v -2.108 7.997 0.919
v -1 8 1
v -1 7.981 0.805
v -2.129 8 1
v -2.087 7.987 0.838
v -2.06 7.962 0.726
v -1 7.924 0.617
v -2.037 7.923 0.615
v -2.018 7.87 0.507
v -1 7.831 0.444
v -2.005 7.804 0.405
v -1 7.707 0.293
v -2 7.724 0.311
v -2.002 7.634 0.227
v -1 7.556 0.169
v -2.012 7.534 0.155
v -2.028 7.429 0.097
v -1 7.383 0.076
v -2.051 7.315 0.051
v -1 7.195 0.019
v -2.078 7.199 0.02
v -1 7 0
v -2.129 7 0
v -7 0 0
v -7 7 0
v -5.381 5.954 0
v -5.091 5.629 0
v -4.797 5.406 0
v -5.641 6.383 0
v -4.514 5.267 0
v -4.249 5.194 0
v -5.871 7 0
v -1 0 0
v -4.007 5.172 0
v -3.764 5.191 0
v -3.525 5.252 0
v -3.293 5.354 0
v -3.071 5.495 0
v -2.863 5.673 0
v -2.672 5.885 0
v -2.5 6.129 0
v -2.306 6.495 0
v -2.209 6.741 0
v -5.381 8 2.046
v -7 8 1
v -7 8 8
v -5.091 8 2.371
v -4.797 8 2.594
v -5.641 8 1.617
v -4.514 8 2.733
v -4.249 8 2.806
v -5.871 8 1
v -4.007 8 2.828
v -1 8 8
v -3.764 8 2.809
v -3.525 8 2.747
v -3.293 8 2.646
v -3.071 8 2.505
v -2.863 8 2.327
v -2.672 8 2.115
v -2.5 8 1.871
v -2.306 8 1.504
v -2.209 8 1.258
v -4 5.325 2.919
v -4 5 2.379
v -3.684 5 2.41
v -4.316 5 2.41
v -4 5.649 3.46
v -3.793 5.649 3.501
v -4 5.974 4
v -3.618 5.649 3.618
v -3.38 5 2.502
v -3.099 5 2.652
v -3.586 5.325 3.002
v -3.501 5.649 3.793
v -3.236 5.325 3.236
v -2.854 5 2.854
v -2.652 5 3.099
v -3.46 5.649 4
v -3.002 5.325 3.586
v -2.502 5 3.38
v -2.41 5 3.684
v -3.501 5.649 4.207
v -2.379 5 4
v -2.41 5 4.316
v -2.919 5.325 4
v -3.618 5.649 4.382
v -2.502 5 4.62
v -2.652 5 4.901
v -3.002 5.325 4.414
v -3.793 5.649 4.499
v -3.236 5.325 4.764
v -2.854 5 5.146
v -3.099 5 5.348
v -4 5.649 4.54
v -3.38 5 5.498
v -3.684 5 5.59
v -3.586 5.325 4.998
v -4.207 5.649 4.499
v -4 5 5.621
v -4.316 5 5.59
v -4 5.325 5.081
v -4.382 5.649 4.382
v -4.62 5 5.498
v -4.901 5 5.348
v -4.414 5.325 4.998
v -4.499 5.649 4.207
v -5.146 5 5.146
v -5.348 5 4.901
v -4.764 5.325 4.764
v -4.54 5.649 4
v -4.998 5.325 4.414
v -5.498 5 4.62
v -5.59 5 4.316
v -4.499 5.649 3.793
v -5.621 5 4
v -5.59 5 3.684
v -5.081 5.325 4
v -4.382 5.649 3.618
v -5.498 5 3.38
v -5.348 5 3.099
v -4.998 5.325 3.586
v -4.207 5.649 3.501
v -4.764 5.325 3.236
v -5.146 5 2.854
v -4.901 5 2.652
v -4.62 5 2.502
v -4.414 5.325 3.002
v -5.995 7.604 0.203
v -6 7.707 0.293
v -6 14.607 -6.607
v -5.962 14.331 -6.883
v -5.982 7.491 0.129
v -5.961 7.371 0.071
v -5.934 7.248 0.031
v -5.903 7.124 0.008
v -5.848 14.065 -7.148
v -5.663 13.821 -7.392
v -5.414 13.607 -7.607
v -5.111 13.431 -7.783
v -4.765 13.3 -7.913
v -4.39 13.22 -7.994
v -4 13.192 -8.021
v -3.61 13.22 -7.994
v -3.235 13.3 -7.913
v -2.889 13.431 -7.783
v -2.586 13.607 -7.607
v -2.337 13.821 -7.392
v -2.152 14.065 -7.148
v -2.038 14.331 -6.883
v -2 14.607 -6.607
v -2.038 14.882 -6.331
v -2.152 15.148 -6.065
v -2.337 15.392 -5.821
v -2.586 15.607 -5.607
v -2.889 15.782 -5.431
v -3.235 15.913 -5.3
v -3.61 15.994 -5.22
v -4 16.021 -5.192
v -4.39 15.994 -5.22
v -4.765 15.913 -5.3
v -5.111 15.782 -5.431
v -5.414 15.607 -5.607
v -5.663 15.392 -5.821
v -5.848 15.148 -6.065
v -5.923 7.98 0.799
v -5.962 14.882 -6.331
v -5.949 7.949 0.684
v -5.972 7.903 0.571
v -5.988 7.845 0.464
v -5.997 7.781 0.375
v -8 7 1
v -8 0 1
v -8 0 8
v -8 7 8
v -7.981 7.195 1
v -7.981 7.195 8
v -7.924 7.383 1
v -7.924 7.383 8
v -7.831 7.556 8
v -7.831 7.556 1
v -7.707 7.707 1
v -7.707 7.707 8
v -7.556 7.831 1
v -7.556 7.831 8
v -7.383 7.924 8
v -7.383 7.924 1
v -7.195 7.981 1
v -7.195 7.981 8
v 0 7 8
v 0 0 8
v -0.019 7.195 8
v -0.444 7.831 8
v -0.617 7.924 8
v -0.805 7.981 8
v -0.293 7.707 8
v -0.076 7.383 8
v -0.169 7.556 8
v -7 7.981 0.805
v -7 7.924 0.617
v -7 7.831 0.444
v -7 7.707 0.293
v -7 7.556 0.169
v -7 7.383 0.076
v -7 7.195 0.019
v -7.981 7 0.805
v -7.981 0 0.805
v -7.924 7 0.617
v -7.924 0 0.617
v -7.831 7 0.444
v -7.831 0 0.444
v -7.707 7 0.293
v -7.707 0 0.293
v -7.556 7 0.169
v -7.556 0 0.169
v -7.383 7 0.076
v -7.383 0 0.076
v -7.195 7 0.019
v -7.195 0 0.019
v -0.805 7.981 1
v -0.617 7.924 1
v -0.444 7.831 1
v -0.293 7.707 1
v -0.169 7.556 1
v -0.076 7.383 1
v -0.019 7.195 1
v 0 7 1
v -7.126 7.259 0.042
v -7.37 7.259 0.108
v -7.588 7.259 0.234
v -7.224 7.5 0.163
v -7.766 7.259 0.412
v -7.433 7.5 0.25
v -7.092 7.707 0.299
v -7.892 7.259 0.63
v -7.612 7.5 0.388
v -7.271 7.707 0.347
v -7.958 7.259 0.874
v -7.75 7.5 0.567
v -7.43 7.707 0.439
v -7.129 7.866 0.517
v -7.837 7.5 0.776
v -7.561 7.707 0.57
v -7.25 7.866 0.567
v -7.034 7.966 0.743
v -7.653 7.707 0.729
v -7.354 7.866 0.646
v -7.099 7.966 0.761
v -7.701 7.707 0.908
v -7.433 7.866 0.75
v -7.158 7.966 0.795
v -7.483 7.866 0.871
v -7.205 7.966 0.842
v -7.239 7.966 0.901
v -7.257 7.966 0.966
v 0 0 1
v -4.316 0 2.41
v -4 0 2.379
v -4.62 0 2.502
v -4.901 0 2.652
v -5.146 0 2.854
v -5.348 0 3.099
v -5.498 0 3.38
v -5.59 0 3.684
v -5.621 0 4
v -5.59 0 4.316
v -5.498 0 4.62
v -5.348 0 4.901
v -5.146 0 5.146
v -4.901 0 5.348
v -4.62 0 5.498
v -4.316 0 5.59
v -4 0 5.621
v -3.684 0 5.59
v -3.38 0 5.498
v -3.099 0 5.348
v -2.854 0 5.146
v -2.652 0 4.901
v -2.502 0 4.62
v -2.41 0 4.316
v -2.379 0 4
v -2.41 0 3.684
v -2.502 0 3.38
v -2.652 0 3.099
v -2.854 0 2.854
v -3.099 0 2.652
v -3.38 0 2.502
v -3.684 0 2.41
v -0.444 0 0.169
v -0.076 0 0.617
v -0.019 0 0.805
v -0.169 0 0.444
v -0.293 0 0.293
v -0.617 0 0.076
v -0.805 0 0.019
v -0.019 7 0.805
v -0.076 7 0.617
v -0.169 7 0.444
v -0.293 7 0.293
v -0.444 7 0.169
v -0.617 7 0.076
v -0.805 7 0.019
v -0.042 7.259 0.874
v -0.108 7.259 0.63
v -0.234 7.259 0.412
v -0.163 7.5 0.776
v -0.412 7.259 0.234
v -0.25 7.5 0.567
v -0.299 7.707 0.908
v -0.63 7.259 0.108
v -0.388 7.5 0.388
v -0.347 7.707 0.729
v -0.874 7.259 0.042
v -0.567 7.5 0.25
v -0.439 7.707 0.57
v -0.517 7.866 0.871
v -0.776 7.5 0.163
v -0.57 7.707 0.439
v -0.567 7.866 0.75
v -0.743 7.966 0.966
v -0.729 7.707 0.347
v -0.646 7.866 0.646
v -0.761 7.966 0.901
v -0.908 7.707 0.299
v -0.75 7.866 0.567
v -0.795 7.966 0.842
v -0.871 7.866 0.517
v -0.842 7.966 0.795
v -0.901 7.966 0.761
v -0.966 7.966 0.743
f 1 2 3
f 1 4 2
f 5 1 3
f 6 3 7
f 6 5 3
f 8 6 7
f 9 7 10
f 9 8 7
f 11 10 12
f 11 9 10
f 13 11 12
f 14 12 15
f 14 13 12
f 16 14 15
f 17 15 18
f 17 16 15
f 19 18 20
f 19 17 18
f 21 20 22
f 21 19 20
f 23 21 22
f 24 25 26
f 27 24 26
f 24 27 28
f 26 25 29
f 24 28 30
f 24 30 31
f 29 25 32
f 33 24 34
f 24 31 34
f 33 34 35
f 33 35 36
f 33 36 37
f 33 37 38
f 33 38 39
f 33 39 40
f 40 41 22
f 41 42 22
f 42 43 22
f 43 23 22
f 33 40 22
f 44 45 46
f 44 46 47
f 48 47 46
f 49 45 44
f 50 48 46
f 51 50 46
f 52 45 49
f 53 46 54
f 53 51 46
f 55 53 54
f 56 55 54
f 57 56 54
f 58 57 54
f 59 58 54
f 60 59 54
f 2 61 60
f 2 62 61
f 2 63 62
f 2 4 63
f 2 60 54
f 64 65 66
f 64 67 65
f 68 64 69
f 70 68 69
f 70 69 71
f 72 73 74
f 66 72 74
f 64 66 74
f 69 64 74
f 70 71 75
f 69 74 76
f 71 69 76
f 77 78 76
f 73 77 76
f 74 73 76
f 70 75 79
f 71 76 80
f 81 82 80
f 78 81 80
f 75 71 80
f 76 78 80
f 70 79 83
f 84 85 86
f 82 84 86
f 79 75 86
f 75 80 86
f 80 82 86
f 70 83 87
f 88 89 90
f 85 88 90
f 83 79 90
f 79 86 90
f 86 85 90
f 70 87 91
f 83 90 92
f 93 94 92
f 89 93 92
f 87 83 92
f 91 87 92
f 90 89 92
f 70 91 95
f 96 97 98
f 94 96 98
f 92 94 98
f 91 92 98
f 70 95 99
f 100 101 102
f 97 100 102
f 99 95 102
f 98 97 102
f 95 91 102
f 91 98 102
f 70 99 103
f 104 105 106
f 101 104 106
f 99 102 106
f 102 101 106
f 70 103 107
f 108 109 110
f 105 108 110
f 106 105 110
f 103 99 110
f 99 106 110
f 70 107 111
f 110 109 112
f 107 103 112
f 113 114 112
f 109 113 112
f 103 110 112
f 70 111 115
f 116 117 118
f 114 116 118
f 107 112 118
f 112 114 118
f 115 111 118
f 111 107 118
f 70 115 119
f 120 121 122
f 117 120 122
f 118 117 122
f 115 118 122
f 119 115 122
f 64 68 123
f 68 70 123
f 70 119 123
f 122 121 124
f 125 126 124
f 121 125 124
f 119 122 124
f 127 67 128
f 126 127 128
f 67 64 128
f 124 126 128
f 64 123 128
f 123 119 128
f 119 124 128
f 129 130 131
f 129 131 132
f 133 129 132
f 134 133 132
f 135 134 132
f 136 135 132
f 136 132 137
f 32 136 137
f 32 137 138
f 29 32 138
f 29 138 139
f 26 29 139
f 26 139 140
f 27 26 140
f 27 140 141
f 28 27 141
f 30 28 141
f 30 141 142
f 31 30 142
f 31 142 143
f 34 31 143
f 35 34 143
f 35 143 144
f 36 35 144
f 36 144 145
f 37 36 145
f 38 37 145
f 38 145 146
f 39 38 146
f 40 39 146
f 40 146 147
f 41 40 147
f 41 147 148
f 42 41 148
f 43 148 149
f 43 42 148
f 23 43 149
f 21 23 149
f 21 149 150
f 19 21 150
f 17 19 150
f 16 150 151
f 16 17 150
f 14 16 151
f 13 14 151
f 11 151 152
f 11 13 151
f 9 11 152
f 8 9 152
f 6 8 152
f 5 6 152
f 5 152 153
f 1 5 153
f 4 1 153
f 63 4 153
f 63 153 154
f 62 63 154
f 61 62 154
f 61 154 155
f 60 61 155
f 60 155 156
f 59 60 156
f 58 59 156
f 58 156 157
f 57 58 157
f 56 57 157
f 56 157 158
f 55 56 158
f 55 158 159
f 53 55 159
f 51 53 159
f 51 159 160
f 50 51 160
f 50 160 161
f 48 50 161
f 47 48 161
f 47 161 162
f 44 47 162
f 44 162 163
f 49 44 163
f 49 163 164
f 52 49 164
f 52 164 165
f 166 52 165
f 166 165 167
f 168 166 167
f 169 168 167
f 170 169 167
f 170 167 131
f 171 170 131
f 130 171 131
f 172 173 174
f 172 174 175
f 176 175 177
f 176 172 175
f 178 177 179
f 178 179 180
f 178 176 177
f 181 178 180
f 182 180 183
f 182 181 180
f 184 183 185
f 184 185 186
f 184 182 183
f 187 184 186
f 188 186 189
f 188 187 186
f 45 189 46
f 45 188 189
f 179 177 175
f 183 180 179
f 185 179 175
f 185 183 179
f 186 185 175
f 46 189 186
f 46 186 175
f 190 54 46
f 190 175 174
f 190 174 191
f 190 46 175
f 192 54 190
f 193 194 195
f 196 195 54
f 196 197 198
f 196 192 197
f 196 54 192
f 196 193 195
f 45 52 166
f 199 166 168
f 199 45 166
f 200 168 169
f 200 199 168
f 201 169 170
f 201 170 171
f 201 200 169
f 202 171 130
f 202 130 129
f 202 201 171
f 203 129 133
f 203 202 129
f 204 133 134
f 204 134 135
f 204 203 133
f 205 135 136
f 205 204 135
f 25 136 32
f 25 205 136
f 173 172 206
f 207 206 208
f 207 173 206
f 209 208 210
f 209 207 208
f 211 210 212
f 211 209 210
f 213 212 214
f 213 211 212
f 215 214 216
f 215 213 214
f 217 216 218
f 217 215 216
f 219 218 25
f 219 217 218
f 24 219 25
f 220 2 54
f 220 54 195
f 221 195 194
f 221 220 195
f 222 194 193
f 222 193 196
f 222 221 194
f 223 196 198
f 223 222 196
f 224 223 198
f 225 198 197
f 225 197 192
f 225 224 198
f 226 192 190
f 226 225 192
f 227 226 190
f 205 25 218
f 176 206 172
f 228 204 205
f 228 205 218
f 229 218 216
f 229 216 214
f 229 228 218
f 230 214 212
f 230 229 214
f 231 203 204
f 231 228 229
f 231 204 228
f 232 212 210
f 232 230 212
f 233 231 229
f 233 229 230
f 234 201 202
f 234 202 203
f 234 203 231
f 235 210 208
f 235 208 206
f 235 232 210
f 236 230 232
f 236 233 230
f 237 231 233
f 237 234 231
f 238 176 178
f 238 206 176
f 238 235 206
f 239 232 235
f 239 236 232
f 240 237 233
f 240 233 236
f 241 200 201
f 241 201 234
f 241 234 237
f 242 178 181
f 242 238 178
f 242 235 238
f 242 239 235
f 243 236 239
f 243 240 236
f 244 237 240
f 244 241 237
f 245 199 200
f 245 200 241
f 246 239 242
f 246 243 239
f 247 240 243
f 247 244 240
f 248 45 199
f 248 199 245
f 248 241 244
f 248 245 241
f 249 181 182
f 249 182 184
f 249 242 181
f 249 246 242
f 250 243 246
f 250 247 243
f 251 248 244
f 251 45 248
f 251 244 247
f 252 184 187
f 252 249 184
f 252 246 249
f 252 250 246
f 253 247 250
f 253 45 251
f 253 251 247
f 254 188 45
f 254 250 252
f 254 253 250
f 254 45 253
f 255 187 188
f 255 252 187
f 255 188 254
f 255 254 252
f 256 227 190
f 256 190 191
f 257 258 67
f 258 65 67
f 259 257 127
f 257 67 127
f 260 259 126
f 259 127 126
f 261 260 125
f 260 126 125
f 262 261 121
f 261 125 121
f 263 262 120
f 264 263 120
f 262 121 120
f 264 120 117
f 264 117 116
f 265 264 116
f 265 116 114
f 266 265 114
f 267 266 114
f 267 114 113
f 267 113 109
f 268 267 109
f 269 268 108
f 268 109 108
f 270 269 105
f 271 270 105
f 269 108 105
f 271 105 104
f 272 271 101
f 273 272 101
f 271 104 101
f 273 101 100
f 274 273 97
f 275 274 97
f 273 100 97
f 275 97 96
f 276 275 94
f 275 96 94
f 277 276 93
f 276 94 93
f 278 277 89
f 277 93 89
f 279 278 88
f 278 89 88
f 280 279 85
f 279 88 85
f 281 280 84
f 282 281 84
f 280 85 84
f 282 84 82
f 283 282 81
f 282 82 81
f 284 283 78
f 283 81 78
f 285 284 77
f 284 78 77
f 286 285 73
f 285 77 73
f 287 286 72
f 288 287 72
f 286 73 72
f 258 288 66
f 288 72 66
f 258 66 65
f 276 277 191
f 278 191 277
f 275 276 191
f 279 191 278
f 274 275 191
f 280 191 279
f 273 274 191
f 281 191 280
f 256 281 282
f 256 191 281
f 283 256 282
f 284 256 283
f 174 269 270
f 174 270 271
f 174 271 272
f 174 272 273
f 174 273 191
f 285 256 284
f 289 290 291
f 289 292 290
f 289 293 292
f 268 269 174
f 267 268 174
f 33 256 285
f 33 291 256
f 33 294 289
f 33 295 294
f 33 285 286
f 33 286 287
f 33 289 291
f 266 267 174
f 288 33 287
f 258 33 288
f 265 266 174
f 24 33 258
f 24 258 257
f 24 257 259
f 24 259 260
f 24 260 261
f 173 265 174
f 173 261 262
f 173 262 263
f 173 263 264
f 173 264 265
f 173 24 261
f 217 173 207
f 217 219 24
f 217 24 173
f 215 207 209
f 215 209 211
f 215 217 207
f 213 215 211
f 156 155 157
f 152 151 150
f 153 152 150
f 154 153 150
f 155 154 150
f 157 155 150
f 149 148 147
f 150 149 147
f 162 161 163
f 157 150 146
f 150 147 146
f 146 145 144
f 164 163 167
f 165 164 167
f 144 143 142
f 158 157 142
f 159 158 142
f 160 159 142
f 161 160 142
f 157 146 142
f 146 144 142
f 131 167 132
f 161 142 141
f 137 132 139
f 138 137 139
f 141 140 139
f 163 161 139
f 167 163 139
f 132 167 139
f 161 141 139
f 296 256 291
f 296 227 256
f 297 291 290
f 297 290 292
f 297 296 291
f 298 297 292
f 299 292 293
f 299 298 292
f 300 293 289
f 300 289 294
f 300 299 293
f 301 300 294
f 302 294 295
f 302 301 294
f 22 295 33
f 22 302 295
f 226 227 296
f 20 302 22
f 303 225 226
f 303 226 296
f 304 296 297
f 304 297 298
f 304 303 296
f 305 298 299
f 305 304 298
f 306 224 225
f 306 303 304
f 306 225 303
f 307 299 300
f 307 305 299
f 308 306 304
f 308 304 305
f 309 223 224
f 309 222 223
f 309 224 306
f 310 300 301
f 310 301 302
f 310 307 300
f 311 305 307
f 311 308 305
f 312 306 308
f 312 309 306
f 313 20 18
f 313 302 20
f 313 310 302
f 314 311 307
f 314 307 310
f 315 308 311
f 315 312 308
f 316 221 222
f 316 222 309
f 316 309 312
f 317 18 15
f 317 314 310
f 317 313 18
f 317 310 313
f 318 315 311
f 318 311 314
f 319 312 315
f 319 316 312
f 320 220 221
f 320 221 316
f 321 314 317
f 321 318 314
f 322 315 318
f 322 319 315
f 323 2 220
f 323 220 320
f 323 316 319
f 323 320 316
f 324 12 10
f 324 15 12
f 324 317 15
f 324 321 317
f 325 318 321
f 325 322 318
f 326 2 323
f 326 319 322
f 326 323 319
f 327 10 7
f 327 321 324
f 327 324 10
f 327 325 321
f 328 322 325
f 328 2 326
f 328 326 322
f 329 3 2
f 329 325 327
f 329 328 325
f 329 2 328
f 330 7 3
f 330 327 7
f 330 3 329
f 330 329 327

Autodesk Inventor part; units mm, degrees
ref_plane "YZ Plane" through (0, 0, 0) normal (1, 0, 0) x (0, 1, 0)
ref_plane "XZ Plane" through (0, 0, 0) normal (0, 1, 0) x (-1, 0, 0)
sketch "Sketch1" plane through (0, 0, 0) normal (0, 0, 1) x (1, 0, 0)
  line L0 (-8, 8) -> (0, 8)
  line L1 (0, 8) -> (0, 0)
  line L2 (0, 0) -> (-8, 0)
  line L3 (-8, 0) -> (-8, 8)
  dimension "d0" = 8
  dimension "d1" = 8
extrude "Extrusion1" add sketch "Sketch1" along normal blind 8
sketch "Sketch5" plane through (0, 0, 8) normal (0, 0, 1) x (1, 0, 0)
  point P0 (0, 0)
sketch "Sketch8" plane through (-8, 8, 0) normal (0, 1, 0) x (1, 0, 0)
  line L0 (8, -8) -> (0, -8) projected
  line L1 (0, 0) -> (0, -8) projected
  point P0 (8, 0)
  point P1 (4, -3)
  dimension "d14" = 5
  dimension "d15" = 4
ref_plane "Work Plane3" through (0, 8, 8) normal (0, -0.7071068, 0.7071068) x (-1, 0, 0)
sketch "Sketch11" plane through (0, 8, 8) normal (0, -0.7071068, 0.7071068) x (-1, 0, 0)
  line L0 (8, 5.6569) -> (0, 5.6569) projected
  circle A0 centre (4, 5.6569) radius 2
  point P0 (0, 11.3137)
  dimension "d21" = 4
extrude "Extrusion4" add sketch "Sketch11" against normal blind 15
sketch "Sketch12" plane through (-8, 0, 0) normal (0, -1, 0) x (1, 0, 0)
  point P0 (8, 0)
  point P1 (4, 4)
  dimension "d24" = 4
  dimension "d25" = 4
hole "Hole1" at (-4, 0, 4) direction (0, 1, 0) diameter 3.242 depth 5 tip angle 118 thread size "M4x0.7" class "6H" standard "ISO Metric profile"
fillet "Fillet1" radius 1 6 edges at (-7, 8, 0) (-8, 8, 4) (-8, 4, 0) (-1, 8, 0) (0, 8, 4) (0, 4, 0)
properties part number "as2"
